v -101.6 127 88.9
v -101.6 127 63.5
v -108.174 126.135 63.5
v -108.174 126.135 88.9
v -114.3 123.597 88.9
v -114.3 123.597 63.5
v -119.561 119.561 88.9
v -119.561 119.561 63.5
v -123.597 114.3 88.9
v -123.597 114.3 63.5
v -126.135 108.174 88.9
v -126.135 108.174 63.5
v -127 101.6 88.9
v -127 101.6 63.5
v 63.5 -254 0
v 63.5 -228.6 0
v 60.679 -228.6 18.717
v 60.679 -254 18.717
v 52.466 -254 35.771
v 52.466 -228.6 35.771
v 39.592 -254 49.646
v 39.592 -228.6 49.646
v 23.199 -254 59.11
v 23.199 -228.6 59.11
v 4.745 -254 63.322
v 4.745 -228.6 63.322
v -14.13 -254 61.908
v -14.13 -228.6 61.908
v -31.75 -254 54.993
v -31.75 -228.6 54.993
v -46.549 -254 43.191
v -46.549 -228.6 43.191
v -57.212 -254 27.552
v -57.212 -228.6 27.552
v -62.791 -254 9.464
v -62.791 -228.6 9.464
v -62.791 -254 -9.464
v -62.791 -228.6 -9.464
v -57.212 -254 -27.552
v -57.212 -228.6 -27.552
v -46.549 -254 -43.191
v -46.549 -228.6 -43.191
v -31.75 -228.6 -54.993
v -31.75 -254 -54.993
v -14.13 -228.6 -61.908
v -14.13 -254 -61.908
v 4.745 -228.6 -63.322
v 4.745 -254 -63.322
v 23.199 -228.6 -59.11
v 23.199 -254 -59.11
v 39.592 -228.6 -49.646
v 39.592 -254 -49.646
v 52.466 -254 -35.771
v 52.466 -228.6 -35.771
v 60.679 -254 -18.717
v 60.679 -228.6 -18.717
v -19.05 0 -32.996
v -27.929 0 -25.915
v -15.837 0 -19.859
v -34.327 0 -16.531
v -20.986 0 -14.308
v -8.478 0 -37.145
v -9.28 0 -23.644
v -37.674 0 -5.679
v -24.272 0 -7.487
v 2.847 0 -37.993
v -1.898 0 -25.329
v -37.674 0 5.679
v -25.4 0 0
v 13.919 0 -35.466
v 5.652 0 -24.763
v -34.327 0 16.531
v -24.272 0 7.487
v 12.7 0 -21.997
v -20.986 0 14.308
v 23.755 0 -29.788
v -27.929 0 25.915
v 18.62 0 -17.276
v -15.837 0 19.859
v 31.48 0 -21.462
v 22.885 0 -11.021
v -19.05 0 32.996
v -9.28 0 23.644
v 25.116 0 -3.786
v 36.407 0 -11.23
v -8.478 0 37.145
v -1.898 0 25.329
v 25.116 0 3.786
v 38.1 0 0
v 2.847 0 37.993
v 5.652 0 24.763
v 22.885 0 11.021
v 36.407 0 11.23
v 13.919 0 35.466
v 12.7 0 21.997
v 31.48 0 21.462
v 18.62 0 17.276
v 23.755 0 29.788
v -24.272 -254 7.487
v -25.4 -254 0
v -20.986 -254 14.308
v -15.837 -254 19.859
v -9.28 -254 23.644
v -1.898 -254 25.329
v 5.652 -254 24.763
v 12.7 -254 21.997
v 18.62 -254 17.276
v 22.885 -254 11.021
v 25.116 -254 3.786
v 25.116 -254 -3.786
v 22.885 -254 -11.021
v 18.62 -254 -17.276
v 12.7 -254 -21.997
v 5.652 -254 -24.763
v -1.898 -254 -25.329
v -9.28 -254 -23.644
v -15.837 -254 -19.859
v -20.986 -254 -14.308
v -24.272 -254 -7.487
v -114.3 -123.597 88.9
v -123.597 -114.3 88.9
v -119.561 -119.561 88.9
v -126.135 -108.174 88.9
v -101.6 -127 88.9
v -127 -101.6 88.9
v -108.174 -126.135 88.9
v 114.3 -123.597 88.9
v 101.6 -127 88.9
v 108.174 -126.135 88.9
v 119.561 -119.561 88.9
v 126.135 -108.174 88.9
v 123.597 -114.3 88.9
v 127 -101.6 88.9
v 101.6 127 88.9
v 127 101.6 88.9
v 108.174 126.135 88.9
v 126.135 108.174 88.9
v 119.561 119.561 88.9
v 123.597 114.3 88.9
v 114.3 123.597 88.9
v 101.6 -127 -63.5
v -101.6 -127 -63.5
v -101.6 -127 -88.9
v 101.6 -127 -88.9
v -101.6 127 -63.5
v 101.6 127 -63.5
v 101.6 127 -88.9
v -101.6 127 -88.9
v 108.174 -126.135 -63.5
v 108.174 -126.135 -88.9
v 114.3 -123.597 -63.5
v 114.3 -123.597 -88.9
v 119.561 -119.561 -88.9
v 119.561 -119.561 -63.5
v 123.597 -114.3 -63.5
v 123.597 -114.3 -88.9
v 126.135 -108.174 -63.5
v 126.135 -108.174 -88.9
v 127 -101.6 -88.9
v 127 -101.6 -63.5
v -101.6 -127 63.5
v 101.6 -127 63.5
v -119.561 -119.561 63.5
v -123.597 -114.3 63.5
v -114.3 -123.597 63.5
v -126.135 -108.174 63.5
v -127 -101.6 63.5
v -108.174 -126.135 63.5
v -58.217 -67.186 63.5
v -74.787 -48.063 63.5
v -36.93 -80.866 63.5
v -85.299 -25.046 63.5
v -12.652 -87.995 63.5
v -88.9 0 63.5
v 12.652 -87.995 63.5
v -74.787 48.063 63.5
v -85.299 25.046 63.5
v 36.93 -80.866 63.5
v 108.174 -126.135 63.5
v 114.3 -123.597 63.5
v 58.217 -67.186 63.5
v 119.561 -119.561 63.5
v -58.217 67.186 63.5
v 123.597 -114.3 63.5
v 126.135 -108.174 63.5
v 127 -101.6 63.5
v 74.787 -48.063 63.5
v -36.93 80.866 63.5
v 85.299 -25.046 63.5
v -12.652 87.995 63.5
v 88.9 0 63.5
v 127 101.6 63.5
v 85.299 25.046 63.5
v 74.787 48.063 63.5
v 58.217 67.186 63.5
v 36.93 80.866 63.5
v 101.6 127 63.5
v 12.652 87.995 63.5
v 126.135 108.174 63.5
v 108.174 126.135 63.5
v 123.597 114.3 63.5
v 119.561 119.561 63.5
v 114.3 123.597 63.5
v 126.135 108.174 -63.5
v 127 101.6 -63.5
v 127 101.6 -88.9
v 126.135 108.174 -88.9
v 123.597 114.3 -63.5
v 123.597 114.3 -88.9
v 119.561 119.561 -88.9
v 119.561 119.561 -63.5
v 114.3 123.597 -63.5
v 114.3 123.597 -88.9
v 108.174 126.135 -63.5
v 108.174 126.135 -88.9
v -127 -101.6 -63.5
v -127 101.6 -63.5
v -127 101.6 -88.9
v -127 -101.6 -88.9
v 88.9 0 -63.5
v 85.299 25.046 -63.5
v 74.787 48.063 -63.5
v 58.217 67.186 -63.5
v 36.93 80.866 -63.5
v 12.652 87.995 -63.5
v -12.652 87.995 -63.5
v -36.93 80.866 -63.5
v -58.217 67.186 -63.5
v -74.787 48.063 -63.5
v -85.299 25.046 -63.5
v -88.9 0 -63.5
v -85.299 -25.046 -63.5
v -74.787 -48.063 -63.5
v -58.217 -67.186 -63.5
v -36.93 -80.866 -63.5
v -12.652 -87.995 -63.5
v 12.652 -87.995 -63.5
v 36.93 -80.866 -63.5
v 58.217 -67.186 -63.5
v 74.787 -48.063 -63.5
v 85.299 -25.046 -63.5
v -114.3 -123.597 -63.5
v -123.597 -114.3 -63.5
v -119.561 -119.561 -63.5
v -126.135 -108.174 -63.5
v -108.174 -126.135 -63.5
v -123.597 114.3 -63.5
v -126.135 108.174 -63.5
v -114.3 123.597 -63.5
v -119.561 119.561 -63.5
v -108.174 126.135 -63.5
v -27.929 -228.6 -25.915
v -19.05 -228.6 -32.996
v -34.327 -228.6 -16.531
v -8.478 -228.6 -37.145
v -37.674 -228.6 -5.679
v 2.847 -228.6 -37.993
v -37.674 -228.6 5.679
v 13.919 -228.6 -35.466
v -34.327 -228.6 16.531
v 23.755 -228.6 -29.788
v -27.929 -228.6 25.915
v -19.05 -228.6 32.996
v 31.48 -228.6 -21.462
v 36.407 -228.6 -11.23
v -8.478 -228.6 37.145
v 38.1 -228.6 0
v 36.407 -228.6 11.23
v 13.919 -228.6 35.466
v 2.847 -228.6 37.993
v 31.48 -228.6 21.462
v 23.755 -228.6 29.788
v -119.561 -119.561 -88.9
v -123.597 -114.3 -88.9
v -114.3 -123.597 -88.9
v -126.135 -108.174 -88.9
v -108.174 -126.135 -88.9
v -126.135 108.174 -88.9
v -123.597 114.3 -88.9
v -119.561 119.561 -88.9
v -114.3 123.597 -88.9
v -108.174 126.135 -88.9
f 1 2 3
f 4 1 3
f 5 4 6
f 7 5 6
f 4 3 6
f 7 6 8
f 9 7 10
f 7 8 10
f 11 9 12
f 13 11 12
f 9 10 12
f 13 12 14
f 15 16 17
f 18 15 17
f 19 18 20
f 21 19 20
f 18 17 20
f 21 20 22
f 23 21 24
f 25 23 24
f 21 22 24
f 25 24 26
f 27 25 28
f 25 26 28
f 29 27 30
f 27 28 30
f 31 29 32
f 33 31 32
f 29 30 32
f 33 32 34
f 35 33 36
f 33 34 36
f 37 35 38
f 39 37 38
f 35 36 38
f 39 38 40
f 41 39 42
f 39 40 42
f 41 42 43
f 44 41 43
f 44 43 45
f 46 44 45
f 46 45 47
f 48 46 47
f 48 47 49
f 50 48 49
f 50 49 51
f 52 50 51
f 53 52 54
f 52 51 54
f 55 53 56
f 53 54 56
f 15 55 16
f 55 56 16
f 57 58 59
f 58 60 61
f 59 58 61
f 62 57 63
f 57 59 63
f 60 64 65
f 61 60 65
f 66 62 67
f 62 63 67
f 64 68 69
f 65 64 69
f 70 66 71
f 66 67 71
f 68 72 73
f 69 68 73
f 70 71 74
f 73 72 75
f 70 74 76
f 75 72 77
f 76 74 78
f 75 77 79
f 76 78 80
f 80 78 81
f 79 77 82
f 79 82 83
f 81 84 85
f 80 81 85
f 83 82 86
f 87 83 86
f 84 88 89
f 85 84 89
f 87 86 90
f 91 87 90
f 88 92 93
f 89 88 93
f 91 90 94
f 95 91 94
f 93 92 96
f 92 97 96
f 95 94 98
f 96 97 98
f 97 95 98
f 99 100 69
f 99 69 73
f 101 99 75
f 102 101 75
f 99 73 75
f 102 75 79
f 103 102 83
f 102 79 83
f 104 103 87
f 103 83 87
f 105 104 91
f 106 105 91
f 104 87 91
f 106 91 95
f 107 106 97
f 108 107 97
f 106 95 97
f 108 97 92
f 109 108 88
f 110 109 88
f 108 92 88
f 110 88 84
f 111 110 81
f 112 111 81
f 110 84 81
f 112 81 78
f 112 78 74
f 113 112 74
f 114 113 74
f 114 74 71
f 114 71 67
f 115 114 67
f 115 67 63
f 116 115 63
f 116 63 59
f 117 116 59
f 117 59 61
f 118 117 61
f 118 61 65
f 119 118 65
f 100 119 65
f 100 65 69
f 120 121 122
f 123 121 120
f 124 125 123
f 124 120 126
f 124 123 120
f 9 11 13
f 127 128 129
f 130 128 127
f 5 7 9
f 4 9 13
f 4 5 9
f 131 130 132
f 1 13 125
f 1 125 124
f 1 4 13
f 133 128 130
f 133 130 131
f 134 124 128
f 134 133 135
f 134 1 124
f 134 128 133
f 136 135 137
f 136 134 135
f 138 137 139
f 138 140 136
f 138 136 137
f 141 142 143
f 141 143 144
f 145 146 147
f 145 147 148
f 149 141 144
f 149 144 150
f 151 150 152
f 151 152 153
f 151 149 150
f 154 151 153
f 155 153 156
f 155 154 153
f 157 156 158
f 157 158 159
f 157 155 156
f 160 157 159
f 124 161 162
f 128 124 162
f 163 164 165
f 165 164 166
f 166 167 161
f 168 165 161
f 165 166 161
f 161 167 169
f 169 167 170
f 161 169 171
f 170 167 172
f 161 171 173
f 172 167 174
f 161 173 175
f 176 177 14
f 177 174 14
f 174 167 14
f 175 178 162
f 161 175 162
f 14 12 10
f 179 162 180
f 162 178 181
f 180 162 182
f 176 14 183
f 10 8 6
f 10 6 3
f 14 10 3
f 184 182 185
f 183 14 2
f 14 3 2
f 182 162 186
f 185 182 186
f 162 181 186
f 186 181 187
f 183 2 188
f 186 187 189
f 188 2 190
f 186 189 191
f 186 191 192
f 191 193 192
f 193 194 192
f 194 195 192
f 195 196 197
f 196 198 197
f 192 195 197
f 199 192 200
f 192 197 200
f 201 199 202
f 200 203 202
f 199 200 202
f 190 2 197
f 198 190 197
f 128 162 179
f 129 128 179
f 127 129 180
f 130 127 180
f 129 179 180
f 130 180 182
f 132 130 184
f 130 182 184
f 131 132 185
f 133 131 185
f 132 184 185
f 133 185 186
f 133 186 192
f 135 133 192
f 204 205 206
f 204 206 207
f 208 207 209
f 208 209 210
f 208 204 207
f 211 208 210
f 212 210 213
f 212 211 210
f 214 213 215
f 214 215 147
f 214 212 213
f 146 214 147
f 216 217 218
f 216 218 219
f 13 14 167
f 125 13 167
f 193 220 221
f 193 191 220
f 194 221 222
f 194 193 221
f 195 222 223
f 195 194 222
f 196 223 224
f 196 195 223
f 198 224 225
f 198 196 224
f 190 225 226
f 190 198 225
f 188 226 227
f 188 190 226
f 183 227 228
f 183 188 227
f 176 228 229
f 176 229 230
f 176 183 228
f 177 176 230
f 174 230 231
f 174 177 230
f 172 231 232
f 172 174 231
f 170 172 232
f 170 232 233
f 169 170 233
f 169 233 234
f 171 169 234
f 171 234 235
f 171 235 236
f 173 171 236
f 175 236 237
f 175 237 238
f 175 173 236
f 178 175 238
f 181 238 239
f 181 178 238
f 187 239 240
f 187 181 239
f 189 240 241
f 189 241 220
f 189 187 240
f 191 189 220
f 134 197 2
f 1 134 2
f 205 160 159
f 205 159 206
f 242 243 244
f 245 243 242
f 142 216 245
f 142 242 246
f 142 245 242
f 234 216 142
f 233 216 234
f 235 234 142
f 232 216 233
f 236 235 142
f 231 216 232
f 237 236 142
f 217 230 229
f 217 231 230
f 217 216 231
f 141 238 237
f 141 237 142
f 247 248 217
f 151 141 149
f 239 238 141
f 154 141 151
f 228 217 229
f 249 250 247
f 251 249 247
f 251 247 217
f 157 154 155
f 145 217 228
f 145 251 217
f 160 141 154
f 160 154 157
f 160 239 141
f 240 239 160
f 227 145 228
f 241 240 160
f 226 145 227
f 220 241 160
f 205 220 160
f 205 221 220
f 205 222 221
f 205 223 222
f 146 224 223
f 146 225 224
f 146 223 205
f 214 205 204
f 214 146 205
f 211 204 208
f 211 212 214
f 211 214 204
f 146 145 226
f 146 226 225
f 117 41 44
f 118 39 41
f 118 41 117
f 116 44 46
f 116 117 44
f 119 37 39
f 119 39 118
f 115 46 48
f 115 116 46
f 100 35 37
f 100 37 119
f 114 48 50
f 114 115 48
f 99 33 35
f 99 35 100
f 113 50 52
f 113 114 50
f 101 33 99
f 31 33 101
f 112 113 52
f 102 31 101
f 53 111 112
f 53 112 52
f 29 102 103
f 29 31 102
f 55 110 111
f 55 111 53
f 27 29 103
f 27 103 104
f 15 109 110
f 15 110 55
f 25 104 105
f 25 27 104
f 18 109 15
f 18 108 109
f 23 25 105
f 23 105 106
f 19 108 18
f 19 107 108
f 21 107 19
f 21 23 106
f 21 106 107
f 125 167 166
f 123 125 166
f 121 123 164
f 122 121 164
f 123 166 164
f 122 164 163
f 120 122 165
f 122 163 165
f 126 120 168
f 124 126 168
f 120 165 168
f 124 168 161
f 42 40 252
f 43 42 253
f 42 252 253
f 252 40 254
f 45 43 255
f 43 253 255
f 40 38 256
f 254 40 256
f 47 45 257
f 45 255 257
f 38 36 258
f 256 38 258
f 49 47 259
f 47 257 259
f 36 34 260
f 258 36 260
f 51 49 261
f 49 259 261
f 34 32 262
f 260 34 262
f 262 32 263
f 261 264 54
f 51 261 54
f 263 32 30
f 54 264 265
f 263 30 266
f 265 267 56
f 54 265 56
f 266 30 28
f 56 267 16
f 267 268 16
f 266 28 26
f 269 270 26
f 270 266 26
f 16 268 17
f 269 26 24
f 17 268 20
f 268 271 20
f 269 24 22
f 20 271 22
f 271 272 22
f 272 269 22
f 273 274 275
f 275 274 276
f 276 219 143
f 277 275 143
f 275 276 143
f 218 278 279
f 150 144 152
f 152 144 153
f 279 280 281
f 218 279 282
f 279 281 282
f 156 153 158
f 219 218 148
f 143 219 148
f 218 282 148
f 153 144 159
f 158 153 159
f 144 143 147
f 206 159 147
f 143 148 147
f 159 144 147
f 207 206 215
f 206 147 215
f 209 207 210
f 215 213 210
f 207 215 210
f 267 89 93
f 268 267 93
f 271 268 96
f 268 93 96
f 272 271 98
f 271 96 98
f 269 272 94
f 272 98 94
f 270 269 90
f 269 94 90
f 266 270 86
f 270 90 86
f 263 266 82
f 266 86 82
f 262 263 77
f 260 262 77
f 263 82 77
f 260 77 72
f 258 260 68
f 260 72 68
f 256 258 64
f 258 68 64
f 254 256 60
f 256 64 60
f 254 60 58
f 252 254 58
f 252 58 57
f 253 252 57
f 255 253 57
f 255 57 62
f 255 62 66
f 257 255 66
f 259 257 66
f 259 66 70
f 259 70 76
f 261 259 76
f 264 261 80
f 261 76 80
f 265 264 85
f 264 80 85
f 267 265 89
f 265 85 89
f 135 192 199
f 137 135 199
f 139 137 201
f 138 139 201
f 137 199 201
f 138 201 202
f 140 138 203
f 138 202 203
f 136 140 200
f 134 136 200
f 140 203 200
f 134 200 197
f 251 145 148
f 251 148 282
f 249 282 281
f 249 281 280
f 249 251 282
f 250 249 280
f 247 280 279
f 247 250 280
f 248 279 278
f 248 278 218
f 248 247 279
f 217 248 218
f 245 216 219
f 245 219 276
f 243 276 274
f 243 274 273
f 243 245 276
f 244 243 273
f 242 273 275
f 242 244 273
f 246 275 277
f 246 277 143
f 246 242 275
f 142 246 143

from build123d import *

# Parameters (mm, degrees)
F0_R     = 88.9
F1_DEPTH = 63.5
F3_DEPTH = 25.4
F5_R     = 38.1
F6_DEPTH = 228.6
F7_R     = 63.5
F8_DEPTH = 25.4
F10_D    = 50.8


with BuildPart() as f1:
    # F0 (on Top) → F1 (new body, symmetric)
    with BuildSketch(Plane.XY):
        Circle(F0_R)
    extrude(amount=F1_DEPTH, both=True)

    # F2 (on face) → F3 (join)
    with BuildSketch(Plane.XY.offset(63.5)):
        with BuildLine():
            Line((101.6, 127), (0, 127))
            Line((0, 127), (-101.6, 127))
            ThreePointArc((-101.6, 127), (-119.5605122421, 119.5605122421), (-127, 101.6))
            Line((-127, 101.6), (-127, 0))
            Line((-127, 0), (-127, -101.6))
            ThreePointArc((-127, -101.6), (-119.5605122421, -119.5605122421), (-101.6, -127))
            Line((-101.6, -127), (0, -127))
            Line((0, -127), (101.6, -127))
            ThreePointArc((101.6, -127), (119.5605122421, -119.5605122421), (127, -101.6))
            Line((127, -101.6), (127, 0))
            Line((127, 0), (127, 101.6))
            ThreePointArc((127, 101.6), (119.5605122421, 119.5605122421), (101.6, 127))
        make_face()
    extrude(amount=F3_DEPTH)

    # F4: F1 across plane


with BuildPart() as f1_1:
    add(f1.part)
    add(f1.part.mirror(Plane.XY))


with BuildPart() as f6:
    # F5 (on Front) → F6 (new body)
    with BuildSketch(Plane.XZ):
        Circle(F5_R)
    extrude(amount=F6_DEPTH)

    # F7 (on face) → F8 (join)
    with BuildSketch(Plane.XZ.offset(228.6)):
        Circle(F7_R)
    extrude(amount=F8_DEPTH)

    # F10 (through all)
    with Locations(Plane.XZ.offset(254)):
        with Locations((0, 0)):
            Hole(F10_D / 2)


solid = Compound([f1_1.part, f6.part])
